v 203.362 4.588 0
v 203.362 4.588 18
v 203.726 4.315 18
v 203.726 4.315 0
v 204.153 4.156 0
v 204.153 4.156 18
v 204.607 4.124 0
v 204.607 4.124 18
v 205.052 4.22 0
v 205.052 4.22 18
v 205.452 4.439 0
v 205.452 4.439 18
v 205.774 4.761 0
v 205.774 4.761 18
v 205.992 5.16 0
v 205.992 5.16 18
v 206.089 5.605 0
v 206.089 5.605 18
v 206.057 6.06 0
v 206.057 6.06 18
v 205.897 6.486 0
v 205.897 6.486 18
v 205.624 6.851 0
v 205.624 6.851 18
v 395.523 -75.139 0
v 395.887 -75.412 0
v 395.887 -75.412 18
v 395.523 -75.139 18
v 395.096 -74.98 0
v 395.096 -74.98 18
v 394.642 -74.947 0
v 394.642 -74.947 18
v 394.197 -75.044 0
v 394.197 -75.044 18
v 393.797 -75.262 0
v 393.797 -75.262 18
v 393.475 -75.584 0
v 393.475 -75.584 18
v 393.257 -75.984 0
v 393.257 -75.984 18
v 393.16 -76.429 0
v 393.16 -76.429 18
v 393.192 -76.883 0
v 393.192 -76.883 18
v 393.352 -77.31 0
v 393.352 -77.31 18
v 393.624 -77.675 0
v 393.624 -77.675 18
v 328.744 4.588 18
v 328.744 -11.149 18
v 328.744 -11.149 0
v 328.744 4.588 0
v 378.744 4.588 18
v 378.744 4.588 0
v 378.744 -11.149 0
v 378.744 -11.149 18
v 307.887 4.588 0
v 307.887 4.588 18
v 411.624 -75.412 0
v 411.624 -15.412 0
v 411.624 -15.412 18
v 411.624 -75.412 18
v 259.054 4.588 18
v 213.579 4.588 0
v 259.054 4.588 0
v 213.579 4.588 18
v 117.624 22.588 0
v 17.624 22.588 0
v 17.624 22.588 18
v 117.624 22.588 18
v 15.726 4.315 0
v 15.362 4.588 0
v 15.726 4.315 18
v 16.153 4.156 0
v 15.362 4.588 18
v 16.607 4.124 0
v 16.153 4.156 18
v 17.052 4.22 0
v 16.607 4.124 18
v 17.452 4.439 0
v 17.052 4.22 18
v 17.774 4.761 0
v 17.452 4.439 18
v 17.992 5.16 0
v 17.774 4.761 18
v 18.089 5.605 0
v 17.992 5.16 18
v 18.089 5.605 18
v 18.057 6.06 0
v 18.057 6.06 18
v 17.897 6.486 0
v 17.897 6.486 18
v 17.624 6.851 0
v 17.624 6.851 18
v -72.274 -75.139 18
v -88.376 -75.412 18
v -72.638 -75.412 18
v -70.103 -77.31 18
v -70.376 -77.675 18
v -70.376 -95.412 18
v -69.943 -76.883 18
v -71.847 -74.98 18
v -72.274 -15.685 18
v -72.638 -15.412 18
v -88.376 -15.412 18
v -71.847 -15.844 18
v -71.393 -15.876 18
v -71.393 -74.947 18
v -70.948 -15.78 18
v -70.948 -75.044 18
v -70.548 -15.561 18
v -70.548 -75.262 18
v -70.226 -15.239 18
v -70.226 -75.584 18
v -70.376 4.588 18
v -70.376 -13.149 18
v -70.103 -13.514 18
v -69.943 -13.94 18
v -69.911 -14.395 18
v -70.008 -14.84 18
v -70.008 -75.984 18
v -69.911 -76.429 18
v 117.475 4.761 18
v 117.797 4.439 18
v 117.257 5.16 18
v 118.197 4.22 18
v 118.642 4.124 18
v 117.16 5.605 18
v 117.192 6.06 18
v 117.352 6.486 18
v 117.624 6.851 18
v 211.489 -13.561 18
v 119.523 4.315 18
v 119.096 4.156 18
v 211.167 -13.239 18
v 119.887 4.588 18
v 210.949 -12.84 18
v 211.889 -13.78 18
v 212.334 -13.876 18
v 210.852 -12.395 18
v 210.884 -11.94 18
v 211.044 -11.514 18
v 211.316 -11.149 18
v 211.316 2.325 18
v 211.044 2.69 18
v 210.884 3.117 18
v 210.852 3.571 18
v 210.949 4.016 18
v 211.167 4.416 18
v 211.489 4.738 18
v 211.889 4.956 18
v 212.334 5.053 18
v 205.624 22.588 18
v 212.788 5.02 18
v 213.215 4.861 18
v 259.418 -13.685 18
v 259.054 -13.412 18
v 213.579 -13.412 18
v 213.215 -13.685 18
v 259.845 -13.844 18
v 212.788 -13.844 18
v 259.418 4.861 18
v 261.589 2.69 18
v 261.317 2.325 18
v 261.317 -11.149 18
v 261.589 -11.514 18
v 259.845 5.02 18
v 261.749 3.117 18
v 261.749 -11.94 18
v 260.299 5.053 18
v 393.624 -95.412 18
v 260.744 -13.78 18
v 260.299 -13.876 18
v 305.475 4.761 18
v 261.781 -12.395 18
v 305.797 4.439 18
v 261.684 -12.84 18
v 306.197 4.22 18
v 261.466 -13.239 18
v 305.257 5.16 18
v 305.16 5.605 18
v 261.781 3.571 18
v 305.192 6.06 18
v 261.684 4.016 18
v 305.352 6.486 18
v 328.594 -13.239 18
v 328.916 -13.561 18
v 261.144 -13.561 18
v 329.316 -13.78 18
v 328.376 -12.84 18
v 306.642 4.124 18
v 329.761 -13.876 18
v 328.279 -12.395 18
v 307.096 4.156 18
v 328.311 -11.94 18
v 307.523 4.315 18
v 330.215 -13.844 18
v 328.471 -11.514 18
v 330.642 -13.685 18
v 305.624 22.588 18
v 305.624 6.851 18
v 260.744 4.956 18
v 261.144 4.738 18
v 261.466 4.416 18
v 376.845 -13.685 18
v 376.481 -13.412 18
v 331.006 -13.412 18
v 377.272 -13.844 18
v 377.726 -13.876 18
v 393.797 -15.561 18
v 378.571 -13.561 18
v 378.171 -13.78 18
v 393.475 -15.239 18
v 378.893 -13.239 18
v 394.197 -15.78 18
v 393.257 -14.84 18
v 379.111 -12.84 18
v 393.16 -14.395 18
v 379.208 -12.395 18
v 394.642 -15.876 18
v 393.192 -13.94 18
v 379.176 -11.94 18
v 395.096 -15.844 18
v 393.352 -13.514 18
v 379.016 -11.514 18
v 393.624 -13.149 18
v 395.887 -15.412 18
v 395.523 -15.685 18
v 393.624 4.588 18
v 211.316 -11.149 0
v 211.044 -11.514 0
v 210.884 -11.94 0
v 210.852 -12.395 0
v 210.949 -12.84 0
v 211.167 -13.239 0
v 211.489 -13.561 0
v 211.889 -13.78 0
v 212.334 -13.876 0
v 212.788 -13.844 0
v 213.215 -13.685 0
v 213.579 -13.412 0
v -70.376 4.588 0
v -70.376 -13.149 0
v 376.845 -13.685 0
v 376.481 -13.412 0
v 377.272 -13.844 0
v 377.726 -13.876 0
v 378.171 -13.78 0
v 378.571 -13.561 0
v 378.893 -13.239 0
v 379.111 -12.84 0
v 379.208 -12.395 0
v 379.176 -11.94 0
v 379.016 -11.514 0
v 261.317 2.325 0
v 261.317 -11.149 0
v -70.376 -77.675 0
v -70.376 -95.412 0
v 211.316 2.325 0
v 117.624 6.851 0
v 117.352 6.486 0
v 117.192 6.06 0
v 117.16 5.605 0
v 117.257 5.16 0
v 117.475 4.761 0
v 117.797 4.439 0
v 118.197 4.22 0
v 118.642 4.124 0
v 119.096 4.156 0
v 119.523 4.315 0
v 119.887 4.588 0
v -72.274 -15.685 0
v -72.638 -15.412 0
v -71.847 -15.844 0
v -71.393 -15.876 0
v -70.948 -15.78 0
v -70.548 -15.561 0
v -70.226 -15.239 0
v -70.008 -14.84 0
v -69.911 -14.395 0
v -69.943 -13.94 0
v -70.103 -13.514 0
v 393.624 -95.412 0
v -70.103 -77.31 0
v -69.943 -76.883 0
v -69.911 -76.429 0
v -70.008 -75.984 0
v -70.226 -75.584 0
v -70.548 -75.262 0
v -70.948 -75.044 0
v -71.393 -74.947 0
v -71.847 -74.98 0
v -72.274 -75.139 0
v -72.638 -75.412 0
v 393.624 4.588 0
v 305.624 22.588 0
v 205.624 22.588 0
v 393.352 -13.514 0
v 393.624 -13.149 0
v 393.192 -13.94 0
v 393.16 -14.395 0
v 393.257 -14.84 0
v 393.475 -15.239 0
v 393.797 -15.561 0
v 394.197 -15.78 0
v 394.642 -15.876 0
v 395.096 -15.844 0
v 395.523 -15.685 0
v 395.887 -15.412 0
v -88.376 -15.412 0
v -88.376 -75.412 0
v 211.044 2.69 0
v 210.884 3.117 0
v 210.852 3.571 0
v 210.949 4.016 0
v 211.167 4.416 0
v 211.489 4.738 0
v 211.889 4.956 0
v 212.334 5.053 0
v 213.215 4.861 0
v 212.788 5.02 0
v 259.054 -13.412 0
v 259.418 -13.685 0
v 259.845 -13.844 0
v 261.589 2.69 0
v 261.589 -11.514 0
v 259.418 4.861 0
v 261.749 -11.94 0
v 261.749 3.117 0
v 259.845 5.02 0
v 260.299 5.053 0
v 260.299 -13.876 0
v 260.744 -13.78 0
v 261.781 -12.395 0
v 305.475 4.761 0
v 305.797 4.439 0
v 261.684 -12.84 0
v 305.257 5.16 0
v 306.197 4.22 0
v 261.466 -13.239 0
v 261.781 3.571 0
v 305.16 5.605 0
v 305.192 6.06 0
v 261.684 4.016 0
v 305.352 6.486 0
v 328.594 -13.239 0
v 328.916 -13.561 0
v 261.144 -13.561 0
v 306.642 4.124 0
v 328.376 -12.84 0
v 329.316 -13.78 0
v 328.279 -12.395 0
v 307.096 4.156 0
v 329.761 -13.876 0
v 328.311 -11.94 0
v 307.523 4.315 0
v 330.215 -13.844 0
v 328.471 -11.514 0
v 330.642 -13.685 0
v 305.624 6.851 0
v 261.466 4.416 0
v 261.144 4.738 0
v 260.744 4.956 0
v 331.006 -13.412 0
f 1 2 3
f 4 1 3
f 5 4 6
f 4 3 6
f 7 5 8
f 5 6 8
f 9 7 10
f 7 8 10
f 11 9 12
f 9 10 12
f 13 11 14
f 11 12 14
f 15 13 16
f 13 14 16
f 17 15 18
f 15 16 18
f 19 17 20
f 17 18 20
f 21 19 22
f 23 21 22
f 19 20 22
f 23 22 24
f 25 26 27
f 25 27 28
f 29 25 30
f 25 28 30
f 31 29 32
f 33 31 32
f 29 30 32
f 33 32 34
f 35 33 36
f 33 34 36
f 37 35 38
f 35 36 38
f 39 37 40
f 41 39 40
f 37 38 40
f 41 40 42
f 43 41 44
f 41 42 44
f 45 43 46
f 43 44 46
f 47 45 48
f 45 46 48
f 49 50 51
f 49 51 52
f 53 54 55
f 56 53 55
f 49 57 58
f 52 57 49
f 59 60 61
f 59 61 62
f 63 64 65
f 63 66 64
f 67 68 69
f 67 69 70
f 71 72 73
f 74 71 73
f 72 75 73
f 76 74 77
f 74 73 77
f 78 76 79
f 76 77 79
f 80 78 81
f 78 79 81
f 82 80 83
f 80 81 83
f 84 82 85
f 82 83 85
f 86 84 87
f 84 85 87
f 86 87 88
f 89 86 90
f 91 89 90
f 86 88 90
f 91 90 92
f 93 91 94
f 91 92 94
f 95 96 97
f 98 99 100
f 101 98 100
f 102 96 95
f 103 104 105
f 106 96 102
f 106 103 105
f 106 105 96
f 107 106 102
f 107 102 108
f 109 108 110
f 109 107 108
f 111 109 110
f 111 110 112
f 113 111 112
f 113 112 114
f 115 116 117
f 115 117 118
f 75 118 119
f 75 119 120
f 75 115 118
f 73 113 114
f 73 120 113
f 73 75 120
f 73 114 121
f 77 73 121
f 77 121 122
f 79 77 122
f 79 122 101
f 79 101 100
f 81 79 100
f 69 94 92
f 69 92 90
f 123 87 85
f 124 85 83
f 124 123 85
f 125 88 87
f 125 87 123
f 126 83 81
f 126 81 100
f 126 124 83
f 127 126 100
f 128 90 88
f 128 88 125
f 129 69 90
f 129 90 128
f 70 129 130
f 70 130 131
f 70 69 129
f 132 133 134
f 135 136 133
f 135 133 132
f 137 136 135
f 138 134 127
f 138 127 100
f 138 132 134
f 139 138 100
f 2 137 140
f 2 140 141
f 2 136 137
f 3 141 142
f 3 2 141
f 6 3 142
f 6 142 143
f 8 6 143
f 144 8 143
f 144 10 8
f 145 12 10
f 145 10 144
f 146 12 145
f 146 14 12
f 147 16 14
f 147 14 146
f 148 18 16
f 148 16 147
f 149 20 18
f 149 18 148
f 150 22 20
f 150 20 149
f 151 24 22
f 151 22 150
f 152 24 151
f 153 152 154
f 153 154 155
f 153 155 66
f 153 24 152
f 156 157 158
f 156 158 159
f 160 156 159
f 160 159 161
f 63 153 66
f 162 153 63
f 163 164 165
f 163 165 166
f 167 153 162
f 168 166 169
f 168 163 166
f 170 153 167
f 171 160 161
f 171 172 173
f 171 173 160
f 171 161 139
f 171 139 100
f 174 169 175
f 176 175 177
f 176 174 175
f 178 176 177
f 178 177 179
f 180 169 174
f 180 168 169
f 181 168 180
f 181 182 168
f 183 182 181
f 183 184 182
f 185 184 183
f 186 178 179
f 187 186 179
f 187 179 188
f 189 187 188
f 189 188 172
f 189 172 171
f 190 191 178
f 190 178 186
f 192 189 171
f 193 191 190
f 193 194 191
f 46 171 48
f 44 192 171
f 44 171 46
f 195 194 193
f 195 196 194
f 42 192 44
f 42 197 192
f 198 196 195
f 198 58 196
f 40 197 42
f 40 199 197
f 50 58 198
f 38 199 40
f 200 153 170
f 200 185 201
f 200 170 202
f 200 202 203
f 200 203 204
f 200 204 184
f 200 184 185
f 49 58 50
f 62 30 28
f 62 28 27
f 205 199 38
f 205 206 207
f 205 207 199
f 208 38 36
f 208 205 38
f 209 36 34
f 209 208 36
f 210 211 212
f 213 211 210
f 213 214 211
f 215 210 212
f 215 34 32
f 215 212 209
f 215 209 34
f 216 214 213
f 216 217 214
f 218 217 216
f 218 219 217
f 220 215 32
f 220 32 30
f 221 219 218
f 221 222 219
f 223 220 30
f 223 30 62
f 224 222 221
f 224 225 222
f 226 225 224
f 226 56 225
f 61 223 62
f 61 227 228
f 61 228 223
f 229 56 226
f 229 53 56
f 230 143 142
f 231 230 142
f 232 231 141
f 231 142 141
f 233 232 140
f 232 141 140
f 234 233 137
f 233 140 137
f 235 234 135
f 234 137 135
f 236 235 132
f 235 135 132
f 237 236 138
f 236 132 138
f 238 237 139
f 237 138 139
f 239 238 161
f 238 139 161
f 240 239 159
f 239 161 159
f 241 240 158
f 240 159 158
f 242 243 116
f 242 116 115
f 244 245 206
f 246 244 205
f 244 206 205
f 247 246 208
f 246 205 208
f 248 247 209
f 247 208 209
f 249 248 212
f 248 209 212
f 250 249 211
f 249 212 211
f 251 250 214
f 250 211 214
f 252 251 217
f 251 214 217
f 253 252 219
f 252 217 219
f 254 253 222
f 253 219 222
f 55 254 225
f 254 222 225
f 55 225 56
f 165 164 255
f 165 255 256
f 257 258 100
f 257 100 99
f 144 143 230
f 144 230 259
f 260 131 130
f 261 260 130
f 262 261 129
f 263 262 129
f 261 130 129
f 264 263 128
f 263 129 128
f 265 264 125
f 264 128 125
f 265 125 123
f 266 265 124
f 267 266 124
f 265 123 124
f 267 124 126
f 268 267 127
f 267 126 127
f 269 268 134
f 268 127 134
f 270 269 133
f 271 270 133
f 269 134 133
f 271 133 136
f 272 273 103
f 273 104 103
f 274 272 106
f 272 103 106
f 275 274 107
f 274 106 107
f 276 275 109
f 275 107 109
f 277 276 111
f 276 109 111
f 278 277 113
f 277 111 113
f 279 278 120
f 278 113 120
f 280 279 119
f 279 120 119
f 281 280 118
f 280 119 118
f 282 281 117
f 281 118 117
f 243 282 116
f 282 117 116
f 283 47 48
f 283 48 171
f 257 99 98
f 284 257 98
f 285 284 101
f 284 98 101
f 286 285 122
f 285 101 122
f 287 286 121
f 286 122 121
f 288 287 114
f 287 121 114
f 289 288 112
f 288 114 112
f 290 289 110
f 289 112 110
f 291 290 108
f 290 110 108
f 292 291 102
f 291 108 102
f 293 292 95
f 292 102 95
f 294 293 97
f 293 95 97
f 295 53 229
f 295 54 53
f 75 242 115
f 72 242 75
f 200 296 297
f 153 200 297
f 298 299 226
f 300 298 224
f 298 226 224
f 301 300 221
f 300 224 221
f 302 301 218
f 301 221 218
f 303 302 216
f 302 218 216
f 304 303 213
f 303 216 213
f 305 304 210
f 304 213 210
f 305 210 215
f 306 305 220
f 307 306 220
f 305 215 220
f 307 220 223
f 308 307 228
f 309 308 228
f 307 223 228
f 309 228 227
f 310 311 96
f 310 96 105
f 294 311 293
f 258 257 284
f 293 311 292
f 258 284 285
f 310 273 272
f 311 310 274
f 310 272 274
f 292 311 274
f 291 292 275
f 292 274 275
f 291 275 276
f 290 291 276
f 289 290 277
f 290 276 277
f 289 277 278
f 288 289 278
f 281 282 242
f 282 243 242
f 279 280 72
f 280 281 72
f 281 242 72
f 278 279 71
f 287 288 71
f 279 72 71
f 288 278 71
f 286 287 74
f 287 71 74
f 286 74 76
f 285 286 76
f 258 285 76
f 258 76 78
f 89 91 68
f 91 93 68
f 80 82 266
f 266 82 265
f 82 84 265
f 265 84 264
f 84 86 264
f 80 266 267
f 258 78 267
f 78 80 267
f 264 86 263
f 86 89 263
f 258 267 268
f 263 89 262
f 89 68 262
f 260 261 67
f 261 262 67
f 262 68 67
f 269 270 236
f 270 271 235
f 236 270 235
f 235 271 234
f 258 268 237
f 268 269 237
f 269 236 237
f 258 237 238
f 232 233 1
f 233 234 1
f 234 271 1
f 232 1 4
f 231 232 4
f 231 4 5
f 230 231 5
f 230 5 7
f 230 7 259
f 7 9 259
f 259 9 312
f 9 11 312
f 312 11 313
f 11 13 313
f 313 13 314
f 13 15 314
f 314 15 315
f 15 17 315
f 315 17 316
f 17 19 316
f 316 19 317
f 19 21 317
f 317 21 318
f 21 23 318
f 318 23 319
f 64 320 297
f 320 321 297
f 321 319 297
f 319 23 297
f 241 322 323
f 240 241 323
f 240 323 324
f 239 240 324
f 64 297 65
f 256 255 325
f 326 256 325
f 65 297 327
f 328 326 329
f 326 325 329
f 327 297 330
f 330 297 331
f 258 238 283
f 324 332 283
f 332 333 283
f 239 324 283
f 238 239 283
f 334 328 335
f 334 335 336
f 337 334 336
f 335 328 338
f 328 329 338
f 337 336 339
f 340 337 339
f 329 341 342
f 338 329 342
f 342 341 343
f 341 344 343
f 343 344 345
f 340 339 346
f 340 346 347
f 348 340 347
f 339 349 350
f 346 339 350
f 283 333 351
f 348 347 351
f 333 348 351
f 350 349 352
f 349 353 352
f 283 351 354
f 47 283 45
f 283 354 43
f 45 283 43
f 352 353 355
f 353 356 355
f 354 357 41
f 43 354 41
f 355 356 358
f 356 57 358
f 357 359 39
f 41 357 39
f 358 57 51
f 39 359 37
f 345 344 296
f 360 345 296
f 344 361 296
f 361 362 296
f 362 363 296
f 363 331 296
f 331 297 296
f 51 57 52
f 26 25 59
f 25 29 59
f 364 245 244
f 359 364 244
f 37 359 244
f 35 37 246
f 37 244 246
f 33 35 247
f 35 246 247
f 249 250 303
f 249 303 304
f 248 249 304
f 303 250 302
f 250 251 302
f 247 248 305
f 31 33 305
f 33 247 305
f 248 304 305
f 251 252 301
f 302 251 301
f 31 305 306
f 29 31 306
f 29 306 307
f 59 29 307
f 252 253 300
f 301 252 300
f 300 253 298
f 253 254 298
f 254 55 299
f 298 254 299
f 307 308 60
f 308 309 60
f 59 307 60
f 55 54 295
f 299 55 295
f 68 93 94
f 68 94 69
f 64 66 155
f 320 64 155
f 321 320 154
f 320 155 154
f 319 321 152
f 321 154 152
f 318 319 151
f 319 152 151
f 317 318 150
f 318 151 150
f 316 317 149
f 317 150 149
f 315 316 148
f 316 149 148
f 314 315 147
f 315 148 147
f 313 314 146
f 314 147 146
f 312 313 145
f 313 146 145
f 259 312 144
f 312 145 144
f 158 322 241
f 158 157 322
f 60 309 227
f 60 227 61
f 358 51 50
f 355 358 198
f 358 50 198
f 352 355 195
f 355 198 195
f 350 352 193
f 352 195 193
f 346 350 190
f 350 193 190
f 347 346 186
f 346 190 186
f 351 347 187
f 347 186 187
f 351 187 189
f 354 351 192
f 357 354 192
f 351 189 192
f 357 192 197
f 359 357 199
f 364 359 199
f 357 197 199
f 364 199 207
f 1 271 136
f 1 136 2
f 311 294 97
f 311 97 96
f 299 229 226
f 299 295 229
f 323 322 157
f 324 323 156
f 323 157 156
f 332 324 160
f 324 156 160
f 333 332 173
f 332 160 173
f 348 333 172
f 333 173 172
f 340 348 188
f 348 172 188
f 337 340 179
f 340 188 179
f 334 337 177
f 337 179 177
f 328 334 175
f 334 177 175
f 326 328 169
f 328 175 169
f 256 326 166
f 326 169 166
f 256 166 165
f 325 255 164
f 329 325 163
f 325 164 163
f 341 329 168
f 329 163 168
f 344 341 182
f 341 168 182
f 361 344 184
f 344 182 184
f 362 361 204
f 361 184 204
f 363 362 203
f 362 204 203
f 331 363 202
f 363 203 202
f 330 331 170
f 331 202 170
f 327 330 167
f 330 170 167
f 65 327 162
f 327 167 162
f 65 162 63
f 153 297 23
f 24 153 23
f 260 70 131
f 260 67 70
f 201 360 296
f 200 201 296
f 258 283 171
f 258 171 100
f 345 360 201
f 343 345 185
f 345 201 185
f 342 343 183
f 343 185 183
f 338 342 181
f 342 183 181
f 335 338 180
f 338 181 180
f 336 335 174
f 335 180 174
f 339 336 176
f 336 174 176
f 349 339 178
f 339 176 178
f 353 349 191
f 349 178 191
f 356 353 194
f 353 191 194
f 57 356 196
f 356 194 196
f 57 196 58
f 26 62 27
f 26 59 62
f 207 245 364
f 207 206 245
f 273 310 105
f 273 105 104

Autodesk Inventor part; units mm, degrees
ref_plane "YZ Plane" through (0, 0, 0) normal (1, 0, 0) x (0, 1, 0)
ref_plane "XZ Plane" through (0, 0, 0) normal (0, 1, 0) x (-1, 0, 0)
ref_plane "XY Plane" through (0, 0, 0) normal (0, 0, 1) x (1, 0, 0)
sketch "Sketch1" plane through (0, 0, 0) normal (0, 0, 1) x (1, 0, 0)
  line L0 (393.6245, -95.4118) -> (-70.3755, -95.4118)
  line L1 (17.6245, 22.5882) -> (117.6245, 22.5882)
  line L2 (117.6245, 22.5882) -> (117.6245, 4.5882)
  line L3 (17.6245, 4.5882) -> (17.6245, 22.5882)
  line L4 (-70.3755, 4.5882) -> (17.6245, 4.5882)
  line L5 (305.6245, 22.5882) -> (205.6245, 22.5882)
  line L6 (205.6245, 22.5882) -> (205.6245, 4.5882)
  line L7 (305.6245, 4.5882) -> (305.6245, 22.5882)
  line L8 (117.6245, 4.5882) -> (205.6245, 4.5882)
  line L9 (305.6245, 4.5882) -> (393.6245, 4.5882)
  line L10 (-88.3755, -15.4118) -> (-70.3755, -15.4118)
  line L11 (-70.3755, -75.4118) -> (-88.3755, -75.4118)
  line L12 (-88.3755, -75.4118) -> (-88.3755, -15.4118)
  line L13 (-70.3755, -95.4118) -> (-70.3755, -75.4118)
  line L14 (-70.3755, -15.4118) -> (-70.3755, 4.5882)
  line L15 (393.6245, -15.4118) -> (411.6245, -15.4118)
  line L16 (411.6245, -15.4118) -> (411.6245, -75.4118)
  line L17 (411.6245, -75.4118) -> (393.6245, -75.4118)
  line L18 (393.6245, 4.5882) -> (393.6245, -15.4118)
  line L19 (393.6245, -75.4118) -> (393.6245, -95.4118)
  point P0 (0, 0)
  dimension "d0" = 464
  dimension "d4" = 100
  dimension "d5" = 18
  dimension "d9" = 100
  dimension "d10" = 18
  dimension "d13" = 18
  dimension "d14" = 60
  dimension "d17" = 20
  dimension "d19" = 60
  dimension "d20" = 18
  dimension "d21" = 100
  dimension "d37" = 88
  dimension "d38" = 88
  dimension "d39" = 88
extrude "Extrusion1" add sketch "Sketch1" along normal blind 18
sketch "Sketch2" plane through (0, 0, 18) normal (0, 0, 1) x (1, 0, 0)
  line L0 (-70.3755, -15.4118) -> (-71.5069, -14.2805)
  line L1 (-70.3755, -15.4118) -> (-68.7755, -15.4118) construction
  line L2 (-70.3755, -75.4118) -> (-71.5069, -76.5432)
  line L3 (17.6245, 4.5882) -> (16.4931, 5.7195)
  line L4 (17.6245, 4.5882) -> (19.2245, 4.5882) construction
  line L5 (117.6245, 4.5882) -> (118.7558, 5.7195)
  line L6 (205.6245, 4.5882) -> (204.4931, 5.7195)
  line L7 (305.6245, 4.5882) -> (306.7558, 5.7195)
  line L8 (393.6245, -15.4118) -> (394.7558, -14.2805)
  line L9 (393.6245, -75.4118) -> (394.7558, -76.5432)
  circle A0 centre (-71.5069, -14.2805) radius 1.6
  circle A1 centre (-71.5069, -76.5432) radius 1.6
  circle A2 centre (16.4931, 5.7195) radius 1.6
  circle A3 centre (118.7558, 5.7195) radius 1.6
  circle A4 centre (204.4931, 5.7195) radius 1.6
  circle A5 centre (306.7558, 5.7195) radius 1.6
  circle A6 centre (394.7558, -14.2805) radius 1.6
  circle A7 centre (394.7558, -76.5432) radius 1.6
  point P0 (0, 0)
  dimension "d22" = 1.6
  dimension "d23" = 135
  dimension "d24" = 1.6
  dimension "d25" = 135
  dimension "d26" = 3.2
  dimension "d27" = 3.2
  dimension "d28" = 3.2
  dimension "d29" = 3.2
  dimension "d30" = 3.2
  dimension "d32" = 3.2
  dimension "d33" = 3.2
  dimension "d34" = 3.2
extrude "Extrusion2" cut sketch "Sketch2" against normal blind 20
sketch "Sketch3" plane through (0, 0, 18) normal (0, 0, 1) x (1, 0, 0)
  line L0 (211.3165, 4.5882) -> (261.3165, 4.5882)
  line L1 (261.3165, 4.5882) -> (261.3165, -13.4118)
  line L2 (261.3165, -13.4118) -> (211.3165, -13.4118)
  line L3 (211.3165, -13.4118) -> (211.3165, 4.5882)
  line L4 (305.6245, 22.5882) -> (205.6245, 22.5882) projected
  line L5 (205.6245, 22.5882) -> (205.6245, 6.8509) projected
  line L6 (328.7435, 4.5882) -> (378.7435, 4.5882)
  line L7 (378.7435, 4.5882) -> (378.7435, -13.4118)
  line L8 (378.7435, -13.4118) -> (328.7435, -13.4118)
  line L9 (328.7435, -13.4118) -> (328.7435, 4.5882)
  line L10 (393.6245, 4.5882) -> (307.8872, 4.5882) projected
  point P0 (0, 0)
  dimension "d40" = 50
  dimension "d41" = 18
  dimension "d42" = 18
  dimension "d43" = 5.692
  dimension "d44" = 50
  dimension "d45" = 18
  dimension "d46" = 67.427
  dimension "d47" = 0
extrude "Extrusion3" cut sketch "Sketch3" against normal blind 18
sketch "Sketch4" plane through (0, 0, 18) normal (0, 0, 1) x (1, 0, 0)
  line L0 (211.3165, 4.5882) -> (212.4478, 3.4568)
  line L1 (211.3165, 4.5882) -> (212.9165, 4.5882) construction
  line L2 (211.3165, -13.4118) -> (212.4478, -12.2805)
  line L3 (211.3165, -13.4118) -> (212.9165, -13.4118) construction
  line L4 (261.3165, -13.4118) -> (260.1851, -12.2805)
  line L5 (261.3165, 4.5882) -> (260.1851, 3.4568)
  circle A0 centre (212.4478, 3.4568) radius 1.6
  circle A1 centre (212.4478, -12.2805) radius 1.6
  circle A2 centre (260.1851, 3.4568) radius 1.6
  circle A3 centre (260.1851, -12.2805) radius 1.6
  line L6 (328.7435, -13.4118) -> (329.8748, -12.2805)
  line L7 (328.7435, -13.4118) -> (330.3435, -13.4118) construction
  line L8 (378.7435, -13.4118) -> (377.6121, -12.2805)
  circle A4 centre (377.6121, -12.2805) radius 1.6
  circle A5 centre (329.8748, -12.2805) radius 1.6
  point P0 (0, 0)
  dimension "d50" = 1.6
  dimension "d51" = 45
  dimension "d52" = 1.6
  dimension "d53" = 45
  dimension "d54" = 3.2
  dimension "d55" = 3.2
  dimension "d56" = 3.2
  dimension "d57" = 3.2
  dimension "d58" = 1.6
  dimension "d59" = 45
  dimension "d60" = 3.2
  dimension "d61" = 3.2
extrude "Extrusion4" cut sketch "Sketch4" against normal blind 20
properties part number "laterales" material "Wood (Birch)"
